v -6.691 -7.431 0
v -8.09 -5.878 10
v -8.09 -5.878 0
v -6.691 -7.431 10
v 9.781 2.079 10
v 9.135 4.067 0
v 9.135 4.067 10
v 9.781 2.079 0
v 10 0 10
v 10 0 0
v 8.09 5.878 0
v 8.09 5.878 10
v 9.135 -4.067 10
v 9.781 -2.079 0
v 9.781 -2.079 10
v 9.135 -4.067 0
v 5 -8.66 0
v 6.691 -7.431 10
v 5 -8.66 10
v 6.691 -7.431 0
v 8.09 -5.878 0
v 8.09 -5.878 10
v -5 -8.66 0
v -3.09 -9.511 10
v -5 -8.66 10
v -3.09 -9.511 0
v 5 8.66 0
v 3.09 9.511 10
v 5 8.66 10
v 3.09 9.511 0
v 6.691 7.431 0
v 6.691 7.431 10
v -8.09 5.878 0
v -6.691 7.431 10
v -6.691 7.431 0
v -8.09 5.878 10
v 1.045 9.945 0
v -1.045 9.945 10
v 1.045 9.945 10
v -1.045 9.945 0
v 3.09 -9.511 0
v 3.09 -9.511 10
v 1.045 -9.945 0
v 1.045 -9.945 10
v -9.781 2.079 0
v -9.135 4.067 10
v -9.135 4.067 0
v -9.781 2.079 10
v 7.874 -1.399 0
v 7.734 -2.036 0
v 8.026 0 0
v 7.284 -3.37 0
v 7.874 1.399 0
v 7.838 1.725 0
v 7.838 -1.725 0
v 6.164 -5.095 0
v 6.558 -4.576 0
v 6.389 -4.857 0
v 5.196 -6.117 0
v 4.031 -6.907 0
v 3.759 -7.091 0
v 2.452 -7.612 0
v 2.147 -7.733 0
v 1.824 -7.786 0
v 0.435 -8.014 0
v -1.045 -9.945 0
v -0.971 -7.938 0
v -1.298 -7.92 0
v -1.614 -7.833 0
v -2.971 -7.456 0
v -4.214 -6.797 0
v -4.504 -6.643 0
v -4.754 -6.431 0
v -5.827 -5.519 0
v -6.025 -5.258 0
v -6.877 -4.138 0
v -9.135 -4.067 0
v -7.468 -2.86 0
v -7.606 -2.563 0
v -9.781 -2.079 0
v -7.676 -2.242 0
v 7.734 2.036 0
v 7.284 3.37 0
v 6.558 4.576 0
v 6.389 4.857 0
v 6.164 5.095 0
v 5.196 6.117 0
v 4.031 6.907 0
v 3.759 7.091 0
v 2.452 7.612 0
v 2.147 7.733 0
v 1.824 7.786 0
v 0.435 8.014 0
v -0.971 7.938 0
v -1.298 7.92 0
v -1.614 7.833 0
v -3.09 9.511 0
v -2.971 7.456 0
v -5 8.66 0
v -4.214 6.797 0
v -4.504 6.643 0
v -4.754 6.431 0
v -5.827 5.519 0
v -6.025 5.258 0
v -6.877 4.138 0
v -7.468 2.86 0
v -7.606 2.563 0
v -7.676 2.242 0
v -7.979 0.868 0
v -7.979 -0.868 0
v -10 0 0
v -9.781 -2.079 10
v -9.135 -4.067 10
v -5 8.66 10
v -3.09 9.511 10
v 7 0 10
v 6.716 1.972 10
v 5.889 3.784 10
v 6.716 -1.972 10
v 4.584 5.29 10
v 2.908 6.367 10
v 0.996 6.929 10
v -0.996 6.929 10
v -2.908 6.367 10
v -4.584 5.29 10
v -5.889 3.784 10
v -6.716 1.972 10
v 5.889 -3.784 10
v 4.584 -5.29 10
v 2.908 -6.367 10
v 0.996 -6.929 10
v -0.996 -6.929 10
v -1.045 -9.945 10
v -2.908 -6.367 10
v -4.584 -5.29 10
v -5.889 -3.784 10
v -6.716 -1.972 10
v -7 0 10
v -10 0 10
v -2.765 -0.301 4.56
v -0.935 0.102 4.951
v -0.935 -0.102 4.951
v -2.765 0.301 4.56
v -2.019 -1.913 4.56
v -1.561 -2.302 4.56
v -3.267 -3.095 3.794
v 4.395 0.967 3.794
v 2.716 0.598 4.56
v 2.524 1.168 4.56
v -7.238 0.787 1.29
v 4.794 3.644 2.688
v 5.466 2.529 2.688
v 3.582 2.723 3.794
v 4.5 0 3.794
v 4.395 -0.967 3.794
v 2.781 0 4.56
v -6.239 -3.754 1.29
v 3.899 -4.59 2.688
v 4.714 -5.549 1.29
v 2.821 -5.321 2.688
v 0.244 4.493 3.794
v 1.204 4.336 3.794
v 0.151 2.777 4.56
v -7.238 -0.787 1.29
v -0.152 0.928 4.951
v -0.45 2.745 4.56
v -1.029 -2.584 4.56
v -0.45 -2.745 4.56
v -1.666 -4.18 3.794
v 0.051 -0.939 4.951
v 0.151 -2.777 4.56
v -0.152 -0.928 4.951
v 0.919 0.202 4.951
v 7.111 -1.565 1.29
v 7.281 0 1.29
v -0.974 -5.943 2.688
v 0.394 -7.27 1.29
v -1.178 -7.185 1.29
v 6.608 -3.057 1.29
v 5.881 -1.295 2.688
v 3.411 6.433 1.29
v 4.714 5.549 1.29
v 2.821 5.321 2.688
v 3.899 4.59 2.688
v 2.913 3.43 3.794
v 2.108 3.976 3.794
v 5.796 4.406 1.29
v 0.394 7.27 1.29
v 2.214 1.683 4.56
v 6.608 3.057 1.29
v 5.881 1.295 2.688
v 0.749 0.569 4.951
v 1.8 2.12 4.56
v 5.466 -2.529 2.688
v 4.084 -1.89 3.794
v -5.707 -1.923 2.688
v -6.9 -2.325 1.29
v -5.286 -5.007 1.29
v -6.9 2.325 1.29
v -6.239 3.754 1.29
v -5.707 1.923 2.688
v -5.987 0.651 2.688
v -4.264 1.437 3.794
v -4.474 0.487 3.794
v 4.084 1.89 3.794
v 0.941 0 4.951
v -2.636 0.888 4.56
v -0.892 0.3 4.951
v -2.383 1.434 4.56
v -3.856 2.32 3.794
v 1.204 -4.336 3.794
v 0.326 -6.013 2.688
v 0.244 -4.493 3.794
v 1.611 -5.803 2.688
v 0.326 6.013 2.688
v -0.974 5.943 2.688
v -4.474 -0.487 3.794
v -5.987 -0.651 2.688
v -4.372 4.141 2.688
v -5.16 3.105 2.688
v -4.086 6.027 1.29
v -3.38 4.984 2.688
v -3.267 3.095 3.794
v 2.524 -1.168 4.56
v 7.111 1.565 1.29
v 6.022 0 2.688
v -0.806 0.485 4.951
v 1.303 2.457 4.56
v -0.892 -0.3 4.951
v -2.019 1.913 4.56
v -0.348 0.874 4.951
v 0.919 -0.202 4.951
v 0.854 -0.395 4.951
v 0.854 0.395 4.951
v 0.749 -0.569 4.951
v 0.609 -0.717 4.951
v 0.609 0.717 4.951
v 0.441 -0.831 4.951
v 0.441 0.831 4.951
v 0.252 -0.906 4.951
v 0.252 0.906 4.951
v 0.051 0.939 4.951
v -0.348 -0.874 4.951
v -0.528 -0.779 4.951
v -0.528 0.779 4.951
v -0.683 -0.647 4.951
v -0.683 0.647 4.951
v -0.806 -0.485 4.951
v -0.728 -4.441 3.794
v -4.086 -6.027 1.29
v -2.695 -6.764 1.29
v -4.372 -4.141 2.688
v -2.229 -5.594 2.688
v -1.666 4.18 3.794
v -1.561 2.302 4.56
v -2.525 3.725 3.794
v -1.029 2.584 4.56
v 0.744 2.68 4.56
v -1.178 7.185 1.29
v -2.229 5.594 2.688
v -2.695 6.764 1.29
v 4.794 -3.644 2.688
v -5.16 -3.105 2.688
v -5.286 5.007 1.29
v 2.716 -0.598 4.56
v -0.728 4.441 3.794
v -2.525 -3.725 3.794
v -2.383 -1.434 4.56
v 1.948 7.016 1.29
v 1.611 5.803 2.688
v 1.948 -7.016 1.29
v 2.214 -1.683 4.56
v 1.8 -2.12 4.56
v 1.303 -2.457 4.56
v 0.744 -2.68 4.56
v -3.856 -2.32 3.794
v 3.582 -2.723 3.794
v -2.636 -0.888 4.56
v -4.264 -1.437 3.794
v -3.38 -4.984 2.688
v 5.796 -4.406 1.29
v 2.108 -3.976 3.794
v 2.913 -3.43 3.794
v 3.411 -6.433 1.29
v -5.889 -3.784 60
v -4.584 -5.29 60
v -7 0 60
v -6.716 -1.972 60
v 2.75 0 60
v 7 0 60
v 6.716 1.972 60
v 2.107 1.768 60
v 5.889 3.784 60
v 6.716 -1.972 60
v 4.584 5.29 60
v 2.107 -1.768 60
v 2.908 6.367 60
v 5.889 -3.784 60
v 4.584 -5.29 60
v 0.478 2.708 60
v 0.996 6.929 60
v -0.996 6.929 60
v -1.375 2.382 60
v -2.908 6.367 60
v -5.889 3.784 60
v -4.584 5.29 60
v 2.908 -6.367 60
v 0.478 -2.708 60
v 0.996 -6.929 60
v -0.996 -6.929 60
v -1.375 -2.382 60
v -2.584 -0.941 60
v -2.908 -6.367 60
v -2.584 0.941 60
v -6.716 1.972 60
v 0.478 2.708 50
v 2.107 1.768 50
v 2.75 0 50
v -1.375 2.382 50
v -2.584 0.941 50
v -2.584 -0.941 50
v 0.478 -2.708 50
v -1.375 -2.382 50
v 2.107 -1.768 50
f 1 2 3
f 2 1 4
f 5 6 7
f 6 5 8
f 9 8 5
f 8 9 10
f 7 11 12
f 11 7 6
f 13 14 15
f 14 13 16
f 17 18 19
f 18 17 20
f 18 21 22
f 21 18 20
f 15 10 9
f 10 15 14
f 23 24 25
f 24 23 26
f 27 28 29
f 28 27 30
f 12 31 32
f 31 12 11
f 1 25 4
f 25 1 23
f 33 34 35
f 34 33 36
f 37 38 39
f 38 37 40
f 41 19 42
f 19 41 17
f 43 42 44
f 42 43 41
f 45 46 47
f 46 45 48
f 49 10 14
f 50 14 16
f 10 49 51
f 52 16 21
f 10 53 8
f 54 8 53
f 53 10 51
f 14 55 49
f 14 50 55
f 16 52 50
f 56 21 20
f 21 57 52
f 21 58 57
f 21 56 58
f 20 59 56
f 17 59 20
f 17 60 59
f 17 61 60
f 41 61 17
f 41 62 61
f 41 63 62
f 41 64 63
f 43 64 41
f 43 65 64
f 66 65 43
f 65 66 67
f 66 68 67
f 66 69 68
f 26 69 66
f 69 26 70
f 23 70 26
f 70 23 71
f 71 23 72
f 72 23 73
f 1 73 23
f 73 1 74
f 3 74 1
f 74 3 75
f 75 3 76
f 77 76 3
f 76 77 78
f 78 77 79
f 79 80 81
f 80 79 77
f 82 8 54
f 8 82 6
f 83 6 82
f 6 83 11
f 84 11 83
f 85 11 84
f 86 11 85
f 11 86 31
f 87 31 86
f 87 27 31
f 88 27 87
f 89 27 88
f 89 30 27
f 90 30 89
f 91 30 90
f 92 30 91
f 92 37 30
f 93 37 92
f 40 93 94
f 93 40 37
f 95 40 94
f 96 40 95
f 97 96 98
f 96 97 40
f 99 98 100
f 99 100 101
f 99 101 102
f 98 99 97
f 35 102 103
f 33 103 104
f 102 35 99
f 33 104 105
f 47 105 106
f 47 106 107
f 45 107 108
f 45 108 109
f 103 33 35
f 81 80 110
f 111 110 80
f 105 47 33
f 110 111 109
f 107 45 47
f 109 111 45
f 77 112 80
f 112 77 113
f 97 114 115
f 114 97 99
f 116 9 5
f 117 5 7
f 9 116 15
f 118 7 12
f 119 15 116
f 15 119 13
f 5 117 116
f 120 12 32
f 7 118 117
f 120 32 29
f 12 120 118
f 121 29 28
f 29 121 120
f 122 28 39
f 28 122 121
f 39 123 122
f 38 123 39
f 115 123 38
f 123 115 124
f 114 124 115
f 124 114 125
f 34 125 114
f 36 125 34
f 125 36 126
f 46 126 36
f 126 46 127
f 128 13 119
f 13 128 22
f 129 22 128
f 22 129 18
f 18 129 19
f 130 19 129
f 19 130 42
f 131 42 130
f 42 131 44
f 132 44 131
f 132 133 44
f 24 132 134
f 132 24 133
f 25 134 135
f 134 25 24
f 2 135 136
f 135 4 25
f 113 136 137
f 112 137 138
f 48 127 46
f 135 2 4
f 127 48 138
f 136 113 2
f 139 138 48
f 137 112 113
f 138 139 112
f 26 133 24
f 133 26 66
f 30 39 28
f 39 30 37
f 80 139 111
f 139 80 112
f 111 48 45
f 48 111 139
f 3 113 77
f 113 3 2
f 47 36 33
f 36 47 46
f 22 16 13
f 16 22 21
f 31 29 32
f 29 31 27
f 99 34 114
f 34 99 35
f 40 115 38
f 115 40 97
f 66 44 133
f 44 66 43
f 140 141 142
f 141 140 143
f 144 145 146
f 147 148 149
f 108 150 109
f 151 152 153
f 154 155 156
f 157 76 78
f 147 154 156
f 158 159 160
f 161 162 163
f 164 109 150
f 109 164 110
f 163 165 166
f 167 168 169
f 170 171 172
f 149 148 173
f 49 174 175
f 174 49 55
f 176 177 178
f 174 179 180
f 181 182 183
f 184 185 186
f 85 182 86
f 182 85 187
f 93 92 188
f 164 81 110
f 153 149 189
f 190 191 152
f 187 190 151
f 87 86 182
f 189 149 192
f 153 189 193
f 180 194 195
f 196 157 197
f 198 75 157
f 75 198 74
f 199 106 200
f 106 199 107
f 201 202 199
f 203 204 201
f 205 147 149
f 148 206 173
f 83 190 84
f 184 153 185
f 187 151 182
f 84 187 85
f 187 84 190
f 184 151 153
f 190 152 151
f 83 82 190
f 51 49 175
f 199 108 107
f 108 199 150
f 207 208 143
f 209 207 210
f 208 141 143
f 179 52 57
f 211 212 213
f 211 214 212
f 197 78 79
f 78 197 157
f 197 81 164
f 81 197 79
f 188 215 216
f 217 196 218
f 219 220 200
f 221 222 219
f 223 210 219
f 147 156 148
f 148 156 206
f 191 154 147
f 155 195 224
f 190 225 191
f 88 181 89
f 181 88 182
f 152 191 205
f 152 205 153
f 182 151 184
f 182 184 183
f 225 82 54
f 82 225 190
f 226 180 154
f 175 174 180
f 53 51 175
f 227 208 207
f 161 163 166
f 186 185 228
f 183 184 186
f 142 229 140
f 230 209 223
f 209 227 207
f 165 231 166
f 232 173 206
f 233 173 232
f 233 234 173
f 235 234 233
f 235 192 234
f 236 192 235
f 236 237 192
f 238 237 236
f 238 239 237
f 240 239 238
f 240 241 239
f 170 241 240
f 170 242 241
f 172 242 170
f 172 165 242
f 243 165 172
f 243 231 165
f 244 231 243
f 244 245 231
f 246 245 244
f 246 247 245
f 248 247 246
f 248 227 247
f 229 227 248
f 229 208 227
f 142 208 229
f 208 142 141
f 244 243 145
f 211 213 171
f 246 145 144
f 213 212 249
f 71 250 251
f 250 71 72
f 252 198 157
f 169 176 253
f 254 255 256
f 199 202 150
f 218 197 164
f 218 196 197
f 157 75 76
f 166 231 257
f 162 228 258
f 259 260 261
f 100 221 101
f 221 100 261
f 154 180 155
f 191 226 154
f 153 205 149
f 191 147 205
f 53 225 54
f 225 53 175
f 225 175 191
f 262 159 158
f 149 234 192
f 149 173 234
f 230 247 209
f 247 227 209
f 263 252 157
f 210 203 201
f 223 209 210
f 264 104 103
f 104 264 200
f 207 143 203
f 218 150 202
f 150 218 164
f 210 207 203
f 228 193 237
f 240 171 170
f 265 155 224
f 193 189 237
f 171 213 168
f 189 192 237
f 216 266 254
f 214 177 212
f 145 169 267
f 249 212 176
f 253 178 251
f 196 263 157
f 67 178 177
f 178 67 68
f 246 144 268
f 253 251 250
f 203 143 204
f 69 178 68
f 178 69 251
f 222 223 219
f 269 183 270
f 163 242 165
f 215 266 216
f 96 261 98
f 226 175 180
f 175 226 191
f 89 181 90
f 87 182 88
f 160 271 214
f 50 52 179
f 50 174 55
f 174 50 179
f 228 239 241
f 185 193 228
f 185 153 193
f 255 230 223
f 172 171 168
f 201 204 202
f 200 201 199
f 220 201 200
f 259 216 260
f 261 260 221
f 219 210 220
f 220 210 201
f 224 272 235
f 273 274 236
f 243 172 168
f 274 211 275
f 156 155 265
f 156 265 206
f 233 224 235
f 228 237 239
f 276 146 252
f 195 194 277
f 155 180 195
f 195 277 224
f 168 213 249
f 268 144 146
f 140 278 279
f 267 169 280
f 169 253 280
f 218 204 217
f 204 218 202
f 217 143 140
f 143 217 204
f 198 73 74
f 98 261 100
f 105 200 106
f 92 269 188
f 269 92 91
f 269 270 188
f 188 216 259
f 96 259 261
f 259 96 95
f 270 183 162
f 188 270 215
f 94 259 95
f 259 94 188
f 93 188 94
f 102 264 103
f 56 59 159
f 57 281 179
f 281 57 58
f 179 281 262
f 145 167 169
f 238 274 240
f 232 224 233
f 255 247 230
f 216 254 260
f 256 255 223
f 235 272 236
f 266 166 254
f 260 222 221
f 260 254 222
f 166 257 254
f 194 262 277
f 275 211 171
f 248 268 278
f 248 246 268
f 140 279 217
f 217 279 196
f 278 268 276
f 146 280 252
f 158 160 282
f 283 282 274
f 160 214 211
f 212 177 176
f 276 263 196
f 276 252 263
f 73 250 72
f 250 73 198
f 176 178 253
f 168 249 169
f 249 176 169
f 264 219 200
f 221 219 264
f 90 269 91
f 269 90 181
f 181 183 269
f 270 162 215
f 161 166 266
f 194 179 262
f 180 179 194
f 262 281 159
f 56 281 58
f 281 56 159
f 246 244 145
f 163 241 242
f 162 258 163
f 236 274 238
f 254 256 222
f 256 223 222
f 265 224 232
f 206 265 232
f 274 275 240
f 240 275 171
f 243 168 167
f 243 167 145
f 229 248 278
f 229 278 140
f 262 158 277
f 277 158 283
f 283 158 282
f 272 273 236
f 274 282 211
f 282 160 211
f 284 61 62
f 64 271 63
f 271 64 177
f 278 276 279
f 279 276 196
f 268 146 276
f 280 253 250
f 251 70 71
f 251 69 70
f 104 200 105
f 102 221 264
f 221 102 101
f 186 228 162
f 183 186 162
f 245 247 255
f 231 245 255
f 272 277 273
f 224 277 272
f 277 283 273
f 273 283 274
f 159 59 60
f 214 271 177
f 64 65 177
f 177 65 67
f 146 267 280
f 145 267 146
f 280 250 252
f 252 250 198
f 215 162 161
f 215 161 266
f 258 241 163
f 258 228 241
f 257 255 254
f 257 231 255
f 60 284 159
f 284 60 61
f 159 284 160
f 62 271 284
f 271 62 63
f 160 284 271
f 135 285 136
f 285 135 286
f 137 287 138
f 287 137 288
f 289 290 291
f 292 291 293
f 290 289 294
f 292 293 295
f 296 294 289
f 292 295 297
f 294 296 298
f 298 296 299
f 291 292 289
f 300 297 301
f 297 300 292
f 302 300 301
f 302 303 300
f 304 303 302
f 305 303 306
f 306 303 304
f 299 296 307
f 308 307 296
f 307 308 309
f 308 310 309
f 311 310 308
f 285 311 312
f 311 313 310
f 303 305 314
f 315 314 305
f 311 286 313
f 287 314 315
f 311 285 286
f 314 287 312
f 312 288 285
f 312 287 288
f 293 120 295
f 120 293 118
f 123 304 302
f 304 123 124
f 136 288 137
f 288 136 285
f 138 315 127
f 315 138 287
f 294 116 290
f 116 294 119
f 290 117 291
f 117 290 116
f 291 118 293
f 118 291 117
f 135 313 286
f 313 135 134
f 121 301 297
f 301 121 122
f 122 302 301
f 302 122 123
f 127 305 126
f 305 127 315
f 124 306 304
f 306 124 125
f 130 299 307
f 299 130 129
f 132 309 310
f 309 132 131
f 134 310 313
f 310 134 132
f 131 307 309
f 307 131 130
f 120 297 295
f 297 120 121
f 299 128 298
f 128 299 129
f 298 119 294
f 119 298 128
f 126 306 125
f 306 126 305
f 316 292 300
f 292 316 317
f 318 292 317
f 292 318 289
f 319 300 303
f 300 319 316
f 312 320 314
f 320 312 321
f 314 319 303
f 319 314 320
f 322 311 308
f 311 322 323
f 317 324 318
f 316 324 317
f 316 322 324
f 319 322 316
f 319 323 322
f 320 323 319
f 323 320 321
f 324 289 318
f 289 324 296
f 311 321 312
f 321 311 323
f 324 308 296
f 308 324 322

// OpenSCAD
   cupHeight = 10;
   cupDiameter = 20;
   cylDiameter = 14;
   shaftDiameter = 4.9;  // 7.7
   shaftHeight = 50;  // 13
   holeDepth = 10;
   fudge = 0.6;

   difference() {
     cylinder(h = cupHeight, r=cupDiameter/2);
     translate([0,0,-0.4*cupDiameter/2]) { sphere(r=0.9*cupDiameter/2); }
   }
   translate([0,0,cupHeight]) {
   difference() {
       cylinder(h = shaftHeight, r=cylDiameter/2);
       translate([0,0,shaftHeight-holeDepth]) { cylinder(h = shaftHeight+2, r=(shaftDiameter+fudge)/2); }
   }
   }
